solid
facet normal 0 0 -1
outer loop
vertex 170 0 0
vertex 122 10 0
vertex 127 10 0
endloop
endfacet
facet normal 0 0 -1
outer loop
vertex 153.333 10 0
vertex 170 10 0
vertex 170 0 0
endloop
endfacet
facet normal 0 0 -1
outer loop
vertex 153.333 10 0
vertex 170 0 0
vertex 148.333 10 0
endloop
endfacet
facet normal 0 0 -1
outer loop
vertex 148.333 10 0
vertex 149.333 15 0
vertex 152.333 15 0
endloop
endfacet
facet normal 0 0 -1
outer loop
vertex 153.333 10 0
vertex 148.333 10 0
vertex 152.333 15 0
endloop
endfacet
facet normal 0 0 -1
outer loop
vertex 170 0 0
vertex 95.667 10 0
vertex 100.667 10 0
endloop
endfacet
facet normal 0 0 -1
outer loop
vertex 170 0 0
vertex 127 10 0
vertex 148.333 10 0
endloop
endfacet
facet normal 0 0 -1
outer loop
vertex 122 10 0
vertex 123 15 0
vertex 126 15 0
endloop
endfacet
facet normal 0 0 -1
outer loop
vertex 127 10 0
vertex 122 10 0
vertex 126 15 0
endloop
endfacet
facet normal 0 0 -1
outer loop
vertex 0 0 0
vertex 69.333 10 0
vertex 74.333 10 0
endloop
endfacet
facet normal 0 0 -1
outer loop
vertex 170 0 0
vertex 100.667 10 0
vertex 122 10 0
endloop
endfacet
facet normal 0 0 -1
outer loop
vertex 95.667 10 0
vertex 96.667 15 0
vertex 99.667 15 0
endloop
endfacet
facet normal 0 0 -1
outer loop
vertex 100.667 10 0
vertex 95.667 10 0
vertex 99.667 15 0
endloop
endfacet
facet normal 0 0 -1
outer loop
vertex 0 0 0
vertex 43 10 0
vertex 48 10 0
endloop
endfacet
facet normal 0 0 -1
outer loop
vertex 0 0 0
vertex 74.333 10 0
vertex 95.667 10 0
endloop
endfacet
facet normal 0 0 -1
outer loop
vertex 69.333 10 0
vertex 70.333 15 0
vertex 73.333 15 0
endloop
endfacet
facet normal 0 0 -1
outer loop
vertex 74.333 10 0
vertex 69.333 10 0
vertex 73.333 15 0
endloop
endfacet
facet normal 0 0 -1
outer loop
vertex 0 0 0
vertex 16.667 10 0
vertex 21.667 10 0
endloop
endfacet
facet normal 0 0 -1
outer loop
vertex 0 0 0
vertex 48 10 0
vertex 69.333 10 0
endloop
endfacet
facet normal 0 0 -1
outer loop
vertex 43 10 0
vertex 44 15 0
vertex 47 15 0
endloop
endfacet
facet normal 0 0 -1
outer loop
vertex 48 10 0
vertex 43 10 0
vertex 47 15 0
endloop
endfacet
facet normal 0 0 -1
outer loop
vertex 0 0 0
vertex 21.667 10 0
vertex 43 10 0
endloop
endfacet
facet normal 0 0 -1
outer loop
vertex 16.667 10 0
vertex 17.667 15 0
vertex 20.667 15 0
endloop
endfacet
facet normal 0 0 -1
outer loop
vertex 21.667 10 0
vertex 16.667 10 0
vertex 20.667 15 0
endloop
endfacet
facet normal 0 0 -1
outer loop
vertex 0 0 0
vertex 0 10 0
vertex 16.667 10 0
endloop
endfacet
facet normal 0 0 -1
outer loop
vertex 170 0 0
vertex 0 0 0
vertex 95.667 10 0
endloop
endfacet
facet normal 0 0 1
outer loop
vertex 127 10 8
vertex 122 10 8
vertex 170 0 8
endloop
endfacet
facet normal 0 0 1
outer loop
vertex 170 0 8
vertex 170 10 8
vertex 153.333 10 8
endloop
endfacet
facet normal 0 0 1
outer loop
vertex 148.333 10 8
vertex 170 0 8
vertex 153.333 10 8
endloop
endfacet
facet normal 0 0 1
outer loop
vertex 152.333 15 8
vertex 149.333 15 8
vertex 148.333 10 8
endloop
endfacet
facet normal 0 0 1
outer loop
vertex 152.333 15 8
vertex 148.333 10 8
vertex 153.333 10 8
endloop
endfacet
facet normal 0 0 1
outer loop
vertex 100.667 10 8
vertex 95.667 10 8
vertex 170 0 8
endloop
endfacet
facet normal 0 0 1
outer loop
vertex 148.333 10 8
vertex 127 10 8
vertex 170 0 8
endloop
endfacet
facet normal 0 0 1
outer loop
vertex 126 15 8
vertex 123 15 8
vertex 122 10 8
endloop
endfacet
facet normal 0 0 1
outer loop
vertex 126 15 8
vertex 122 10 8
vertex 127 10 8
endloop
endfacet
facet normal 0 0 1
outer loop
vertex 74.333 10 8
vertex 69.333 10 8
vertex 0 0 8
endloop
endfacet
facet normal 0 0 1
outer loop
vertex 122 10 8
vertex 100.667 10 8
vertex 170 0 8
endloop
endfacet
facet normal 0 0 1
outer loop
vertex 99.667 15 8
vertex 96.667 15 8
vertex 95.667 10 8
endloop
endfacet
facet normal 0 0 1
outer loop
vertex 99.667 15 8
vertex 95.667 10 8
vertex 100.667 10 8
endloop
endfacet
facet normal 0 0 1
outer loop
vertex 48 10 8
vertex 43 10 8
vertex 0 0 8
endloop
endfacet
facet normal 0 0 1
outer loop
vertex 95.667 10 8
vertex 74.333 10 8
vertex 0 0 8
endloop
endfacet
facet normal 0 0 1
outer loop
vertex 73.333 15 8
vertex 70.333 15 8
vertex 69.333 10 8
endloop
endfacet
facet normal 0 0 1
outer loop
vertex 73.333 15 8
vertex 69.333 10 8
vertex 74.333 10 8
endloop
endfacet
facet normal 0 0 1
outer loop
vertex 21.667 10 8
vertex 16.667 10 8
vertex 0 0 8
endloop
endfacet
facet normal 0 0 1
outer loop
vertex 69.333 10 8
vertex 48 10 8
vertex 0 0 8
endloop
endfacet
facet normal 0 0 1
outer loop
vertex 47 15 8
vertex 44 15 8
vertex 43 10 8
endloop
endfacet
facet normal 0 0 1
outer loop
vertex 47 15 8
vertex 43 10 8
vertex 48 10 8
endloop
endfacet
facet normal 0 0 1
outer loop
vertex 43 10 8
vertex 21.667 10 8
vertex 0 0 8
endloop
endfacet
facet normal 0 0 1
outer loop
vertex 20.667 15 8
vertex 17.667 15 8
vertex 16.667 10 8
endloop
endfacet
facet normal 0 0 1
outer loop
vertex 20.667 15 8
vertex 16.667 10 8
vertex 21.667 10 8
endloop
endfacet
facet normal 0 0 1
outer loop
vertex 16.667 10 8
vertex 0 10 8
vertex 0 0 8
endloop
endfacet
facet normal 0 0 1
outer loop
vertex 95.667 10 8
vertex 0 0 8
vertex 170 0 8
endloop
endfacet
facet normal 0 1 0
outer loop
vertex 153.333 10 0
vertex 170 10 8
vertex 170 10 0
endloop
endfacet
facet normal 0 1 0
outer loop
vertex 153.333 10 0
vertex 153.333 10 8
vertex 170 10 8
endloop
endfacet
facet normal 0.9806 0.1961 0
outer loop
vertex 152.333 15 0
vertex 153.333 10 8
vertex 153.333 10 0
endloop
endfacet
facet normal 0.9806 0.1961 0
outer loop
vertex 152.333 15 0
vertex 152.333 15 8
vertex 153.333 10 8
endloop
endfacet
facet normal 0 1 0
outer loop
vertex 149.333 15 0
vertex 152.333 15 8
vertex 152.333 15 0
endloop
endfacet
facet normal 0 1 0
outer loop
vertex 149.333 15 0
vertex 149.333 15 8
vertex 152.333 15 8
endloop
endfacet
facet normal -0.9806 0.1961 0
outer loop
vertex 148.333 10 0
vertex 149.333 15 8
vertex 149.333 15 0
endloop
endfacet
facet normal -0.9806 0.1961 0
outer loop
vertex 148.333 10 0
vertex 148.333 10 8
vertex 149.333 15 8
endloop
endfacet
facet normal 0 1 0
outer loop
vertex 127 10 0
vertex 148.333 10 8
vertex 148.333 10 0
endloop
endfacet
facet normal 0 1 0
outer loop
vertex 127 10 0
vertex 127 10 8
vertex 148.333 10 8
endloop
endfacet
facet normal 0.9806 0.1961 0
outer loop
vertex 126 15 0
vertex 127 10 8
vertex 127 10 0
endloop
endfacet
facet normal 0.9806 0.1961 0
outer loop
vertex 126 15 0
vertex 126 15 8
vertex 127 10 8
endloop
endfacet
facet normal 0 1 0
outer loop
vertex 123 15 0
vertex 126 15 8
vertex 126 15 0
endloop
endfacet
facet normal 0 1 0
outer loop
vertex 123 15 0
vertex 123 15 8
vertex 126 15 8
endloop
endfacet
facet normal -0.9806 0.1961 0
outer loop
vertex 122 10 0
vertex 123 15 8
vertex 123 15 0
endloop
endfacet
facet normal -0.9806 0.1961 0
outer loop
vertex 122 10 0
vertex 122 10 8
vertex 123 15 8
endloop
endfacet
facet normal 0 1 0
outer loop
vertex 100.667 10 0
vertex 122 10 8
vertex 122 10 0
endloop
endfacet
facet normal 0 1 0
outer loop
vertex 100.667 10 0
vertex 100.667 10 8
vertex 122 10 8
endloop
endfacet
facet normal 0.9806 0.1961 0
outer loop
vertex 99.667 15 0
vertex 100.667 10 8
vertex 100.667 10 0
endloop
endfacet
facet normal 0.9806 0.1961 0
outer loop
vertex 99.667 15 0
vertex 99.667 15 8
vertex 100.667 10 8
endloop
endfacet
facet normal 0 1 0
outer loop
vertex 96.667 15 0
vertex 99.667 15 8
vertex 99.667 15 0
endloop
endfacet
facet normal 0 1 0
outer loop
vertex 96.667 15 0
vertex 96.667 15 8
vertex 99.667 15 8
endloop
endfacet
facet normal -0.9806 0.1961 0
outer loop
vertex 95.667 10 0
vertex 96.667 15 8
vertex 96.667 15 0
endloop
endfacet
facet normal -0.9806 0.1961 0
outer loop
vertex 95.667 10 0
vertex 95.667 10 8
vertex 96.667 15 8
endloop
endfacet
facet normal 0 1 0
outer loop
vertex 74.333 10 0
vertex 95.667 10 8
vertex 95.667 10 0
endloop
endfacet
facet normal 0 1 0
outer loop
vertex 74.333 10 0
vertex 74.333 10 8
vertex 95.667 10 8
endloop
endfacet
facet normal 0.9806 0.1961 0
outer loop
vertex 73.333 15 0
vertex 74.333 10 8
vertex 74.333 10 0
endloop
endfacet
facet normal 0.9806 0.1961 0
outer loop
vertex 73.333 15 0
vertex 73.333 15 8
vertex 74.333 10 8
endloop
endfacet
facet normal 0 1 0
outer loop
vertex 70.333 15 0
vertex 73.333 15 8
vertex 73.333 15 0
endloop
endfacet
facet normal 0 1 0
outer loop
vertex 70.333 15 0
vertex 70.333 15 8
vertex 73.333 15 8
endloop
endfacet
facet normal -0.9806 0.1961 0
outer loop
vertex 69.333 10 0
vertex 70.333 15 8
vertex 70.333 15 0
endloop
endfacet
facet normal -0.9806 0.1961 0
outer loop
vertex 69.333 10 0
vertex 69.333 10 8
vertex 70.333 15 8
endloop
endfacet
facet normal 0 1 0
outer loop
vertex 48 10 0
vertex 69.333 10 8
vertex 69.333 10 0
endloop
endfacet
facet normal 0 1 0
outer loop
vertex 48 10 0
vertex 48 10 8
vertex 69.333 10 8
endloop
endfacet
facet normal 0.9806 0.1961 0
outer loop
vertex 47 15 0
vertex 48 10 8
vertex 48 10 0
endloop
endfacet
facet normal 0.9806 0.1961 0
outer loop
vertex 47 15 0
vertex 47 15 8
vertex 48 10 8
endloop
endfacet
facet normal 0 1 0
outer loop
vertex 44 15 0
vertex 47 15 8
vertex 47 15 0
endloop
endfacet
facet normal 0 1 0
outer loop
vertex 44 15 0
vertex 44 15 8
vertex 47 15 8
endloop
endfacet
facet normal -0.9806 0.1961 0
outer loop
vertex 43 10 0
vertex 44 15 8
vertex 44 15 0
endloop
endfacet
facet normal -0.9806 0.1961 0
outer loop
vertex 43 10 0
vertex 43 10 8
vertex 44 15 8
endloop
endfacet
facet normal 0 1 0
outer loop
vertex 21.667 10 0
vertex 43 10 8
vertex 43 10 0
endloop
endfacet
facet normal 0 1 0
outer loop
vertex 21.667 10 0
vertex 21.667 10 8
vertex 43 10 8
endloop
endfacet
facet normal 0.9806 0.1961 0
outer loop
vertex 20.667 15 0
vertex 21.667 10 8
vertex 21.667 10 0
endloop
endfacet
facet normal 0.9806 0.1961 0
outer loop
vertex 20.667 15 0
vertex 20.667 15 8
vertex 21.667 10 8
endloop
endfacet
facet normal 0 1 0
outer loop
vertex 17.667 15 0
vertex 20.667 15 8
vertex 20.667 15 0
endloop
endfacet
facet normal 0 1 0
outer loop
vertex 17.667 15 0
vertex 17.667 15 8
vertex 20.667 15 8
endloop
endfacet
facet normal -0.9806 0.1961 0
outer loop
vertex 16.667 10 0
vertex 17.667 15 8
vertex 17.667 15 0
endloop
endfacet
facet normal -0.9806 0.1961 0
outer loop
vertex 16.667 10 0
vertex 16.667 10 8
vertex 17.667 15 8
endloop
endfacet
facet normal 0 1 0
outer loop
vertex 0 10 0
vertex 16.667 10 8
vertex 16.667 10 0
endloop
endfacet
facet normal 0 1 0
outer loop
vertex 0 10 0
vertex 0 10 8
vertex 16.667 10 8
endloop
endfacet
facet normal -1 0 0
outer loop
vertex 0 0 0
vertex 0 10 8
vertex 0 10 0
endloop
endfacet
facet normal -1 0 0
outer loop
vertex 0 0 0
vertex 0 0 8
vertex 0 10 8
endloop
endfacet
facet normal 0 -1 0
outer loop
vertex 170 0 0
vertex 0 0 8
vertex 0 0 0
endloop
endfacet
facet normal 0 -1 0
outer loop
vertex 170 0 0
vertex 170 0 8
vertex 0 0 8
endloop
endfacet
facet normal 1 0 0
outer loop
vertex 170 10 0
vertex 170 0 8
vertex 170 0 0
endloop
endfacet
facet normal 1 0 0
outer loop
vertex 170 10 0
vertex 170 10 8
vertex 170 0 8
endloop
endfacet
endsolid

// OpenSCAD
$fn = 32;

// ----------------------------------------------------------------------
// Gear rack: 6 teeth on a 170 mm bar, pitch 26.33 mm
// ----------------------------------------------------------------------

// --- parameters (mm) ---
profile_height = 8;       // extrusion height
profile_points = 28;      // points of the closed outline

profile = [[0, 0], [170, 0], [170, 10], [153.333, 10], [152.333, 15], [149.333, 15], [148.333, 10], [127, 10], [126, 15], [123, 15], [122, 10], [100.667, 10], [99.667, 15], [96.667, 15], [95.667, 10], [74.333, 10], [73.333, 15], [70.333, 15], [69.333, 10], [48, 10], [47, 15], [44, 15], [43, 10], [21.667, 10], [20.667, 15], [17.667, 15], [16.667, 10], [0, 10]];  // single closed polygon, 28 points, counter clockwise

// --- the one profile operation ---
linear_extrude(height = profile_height) polygon(points = profile);
